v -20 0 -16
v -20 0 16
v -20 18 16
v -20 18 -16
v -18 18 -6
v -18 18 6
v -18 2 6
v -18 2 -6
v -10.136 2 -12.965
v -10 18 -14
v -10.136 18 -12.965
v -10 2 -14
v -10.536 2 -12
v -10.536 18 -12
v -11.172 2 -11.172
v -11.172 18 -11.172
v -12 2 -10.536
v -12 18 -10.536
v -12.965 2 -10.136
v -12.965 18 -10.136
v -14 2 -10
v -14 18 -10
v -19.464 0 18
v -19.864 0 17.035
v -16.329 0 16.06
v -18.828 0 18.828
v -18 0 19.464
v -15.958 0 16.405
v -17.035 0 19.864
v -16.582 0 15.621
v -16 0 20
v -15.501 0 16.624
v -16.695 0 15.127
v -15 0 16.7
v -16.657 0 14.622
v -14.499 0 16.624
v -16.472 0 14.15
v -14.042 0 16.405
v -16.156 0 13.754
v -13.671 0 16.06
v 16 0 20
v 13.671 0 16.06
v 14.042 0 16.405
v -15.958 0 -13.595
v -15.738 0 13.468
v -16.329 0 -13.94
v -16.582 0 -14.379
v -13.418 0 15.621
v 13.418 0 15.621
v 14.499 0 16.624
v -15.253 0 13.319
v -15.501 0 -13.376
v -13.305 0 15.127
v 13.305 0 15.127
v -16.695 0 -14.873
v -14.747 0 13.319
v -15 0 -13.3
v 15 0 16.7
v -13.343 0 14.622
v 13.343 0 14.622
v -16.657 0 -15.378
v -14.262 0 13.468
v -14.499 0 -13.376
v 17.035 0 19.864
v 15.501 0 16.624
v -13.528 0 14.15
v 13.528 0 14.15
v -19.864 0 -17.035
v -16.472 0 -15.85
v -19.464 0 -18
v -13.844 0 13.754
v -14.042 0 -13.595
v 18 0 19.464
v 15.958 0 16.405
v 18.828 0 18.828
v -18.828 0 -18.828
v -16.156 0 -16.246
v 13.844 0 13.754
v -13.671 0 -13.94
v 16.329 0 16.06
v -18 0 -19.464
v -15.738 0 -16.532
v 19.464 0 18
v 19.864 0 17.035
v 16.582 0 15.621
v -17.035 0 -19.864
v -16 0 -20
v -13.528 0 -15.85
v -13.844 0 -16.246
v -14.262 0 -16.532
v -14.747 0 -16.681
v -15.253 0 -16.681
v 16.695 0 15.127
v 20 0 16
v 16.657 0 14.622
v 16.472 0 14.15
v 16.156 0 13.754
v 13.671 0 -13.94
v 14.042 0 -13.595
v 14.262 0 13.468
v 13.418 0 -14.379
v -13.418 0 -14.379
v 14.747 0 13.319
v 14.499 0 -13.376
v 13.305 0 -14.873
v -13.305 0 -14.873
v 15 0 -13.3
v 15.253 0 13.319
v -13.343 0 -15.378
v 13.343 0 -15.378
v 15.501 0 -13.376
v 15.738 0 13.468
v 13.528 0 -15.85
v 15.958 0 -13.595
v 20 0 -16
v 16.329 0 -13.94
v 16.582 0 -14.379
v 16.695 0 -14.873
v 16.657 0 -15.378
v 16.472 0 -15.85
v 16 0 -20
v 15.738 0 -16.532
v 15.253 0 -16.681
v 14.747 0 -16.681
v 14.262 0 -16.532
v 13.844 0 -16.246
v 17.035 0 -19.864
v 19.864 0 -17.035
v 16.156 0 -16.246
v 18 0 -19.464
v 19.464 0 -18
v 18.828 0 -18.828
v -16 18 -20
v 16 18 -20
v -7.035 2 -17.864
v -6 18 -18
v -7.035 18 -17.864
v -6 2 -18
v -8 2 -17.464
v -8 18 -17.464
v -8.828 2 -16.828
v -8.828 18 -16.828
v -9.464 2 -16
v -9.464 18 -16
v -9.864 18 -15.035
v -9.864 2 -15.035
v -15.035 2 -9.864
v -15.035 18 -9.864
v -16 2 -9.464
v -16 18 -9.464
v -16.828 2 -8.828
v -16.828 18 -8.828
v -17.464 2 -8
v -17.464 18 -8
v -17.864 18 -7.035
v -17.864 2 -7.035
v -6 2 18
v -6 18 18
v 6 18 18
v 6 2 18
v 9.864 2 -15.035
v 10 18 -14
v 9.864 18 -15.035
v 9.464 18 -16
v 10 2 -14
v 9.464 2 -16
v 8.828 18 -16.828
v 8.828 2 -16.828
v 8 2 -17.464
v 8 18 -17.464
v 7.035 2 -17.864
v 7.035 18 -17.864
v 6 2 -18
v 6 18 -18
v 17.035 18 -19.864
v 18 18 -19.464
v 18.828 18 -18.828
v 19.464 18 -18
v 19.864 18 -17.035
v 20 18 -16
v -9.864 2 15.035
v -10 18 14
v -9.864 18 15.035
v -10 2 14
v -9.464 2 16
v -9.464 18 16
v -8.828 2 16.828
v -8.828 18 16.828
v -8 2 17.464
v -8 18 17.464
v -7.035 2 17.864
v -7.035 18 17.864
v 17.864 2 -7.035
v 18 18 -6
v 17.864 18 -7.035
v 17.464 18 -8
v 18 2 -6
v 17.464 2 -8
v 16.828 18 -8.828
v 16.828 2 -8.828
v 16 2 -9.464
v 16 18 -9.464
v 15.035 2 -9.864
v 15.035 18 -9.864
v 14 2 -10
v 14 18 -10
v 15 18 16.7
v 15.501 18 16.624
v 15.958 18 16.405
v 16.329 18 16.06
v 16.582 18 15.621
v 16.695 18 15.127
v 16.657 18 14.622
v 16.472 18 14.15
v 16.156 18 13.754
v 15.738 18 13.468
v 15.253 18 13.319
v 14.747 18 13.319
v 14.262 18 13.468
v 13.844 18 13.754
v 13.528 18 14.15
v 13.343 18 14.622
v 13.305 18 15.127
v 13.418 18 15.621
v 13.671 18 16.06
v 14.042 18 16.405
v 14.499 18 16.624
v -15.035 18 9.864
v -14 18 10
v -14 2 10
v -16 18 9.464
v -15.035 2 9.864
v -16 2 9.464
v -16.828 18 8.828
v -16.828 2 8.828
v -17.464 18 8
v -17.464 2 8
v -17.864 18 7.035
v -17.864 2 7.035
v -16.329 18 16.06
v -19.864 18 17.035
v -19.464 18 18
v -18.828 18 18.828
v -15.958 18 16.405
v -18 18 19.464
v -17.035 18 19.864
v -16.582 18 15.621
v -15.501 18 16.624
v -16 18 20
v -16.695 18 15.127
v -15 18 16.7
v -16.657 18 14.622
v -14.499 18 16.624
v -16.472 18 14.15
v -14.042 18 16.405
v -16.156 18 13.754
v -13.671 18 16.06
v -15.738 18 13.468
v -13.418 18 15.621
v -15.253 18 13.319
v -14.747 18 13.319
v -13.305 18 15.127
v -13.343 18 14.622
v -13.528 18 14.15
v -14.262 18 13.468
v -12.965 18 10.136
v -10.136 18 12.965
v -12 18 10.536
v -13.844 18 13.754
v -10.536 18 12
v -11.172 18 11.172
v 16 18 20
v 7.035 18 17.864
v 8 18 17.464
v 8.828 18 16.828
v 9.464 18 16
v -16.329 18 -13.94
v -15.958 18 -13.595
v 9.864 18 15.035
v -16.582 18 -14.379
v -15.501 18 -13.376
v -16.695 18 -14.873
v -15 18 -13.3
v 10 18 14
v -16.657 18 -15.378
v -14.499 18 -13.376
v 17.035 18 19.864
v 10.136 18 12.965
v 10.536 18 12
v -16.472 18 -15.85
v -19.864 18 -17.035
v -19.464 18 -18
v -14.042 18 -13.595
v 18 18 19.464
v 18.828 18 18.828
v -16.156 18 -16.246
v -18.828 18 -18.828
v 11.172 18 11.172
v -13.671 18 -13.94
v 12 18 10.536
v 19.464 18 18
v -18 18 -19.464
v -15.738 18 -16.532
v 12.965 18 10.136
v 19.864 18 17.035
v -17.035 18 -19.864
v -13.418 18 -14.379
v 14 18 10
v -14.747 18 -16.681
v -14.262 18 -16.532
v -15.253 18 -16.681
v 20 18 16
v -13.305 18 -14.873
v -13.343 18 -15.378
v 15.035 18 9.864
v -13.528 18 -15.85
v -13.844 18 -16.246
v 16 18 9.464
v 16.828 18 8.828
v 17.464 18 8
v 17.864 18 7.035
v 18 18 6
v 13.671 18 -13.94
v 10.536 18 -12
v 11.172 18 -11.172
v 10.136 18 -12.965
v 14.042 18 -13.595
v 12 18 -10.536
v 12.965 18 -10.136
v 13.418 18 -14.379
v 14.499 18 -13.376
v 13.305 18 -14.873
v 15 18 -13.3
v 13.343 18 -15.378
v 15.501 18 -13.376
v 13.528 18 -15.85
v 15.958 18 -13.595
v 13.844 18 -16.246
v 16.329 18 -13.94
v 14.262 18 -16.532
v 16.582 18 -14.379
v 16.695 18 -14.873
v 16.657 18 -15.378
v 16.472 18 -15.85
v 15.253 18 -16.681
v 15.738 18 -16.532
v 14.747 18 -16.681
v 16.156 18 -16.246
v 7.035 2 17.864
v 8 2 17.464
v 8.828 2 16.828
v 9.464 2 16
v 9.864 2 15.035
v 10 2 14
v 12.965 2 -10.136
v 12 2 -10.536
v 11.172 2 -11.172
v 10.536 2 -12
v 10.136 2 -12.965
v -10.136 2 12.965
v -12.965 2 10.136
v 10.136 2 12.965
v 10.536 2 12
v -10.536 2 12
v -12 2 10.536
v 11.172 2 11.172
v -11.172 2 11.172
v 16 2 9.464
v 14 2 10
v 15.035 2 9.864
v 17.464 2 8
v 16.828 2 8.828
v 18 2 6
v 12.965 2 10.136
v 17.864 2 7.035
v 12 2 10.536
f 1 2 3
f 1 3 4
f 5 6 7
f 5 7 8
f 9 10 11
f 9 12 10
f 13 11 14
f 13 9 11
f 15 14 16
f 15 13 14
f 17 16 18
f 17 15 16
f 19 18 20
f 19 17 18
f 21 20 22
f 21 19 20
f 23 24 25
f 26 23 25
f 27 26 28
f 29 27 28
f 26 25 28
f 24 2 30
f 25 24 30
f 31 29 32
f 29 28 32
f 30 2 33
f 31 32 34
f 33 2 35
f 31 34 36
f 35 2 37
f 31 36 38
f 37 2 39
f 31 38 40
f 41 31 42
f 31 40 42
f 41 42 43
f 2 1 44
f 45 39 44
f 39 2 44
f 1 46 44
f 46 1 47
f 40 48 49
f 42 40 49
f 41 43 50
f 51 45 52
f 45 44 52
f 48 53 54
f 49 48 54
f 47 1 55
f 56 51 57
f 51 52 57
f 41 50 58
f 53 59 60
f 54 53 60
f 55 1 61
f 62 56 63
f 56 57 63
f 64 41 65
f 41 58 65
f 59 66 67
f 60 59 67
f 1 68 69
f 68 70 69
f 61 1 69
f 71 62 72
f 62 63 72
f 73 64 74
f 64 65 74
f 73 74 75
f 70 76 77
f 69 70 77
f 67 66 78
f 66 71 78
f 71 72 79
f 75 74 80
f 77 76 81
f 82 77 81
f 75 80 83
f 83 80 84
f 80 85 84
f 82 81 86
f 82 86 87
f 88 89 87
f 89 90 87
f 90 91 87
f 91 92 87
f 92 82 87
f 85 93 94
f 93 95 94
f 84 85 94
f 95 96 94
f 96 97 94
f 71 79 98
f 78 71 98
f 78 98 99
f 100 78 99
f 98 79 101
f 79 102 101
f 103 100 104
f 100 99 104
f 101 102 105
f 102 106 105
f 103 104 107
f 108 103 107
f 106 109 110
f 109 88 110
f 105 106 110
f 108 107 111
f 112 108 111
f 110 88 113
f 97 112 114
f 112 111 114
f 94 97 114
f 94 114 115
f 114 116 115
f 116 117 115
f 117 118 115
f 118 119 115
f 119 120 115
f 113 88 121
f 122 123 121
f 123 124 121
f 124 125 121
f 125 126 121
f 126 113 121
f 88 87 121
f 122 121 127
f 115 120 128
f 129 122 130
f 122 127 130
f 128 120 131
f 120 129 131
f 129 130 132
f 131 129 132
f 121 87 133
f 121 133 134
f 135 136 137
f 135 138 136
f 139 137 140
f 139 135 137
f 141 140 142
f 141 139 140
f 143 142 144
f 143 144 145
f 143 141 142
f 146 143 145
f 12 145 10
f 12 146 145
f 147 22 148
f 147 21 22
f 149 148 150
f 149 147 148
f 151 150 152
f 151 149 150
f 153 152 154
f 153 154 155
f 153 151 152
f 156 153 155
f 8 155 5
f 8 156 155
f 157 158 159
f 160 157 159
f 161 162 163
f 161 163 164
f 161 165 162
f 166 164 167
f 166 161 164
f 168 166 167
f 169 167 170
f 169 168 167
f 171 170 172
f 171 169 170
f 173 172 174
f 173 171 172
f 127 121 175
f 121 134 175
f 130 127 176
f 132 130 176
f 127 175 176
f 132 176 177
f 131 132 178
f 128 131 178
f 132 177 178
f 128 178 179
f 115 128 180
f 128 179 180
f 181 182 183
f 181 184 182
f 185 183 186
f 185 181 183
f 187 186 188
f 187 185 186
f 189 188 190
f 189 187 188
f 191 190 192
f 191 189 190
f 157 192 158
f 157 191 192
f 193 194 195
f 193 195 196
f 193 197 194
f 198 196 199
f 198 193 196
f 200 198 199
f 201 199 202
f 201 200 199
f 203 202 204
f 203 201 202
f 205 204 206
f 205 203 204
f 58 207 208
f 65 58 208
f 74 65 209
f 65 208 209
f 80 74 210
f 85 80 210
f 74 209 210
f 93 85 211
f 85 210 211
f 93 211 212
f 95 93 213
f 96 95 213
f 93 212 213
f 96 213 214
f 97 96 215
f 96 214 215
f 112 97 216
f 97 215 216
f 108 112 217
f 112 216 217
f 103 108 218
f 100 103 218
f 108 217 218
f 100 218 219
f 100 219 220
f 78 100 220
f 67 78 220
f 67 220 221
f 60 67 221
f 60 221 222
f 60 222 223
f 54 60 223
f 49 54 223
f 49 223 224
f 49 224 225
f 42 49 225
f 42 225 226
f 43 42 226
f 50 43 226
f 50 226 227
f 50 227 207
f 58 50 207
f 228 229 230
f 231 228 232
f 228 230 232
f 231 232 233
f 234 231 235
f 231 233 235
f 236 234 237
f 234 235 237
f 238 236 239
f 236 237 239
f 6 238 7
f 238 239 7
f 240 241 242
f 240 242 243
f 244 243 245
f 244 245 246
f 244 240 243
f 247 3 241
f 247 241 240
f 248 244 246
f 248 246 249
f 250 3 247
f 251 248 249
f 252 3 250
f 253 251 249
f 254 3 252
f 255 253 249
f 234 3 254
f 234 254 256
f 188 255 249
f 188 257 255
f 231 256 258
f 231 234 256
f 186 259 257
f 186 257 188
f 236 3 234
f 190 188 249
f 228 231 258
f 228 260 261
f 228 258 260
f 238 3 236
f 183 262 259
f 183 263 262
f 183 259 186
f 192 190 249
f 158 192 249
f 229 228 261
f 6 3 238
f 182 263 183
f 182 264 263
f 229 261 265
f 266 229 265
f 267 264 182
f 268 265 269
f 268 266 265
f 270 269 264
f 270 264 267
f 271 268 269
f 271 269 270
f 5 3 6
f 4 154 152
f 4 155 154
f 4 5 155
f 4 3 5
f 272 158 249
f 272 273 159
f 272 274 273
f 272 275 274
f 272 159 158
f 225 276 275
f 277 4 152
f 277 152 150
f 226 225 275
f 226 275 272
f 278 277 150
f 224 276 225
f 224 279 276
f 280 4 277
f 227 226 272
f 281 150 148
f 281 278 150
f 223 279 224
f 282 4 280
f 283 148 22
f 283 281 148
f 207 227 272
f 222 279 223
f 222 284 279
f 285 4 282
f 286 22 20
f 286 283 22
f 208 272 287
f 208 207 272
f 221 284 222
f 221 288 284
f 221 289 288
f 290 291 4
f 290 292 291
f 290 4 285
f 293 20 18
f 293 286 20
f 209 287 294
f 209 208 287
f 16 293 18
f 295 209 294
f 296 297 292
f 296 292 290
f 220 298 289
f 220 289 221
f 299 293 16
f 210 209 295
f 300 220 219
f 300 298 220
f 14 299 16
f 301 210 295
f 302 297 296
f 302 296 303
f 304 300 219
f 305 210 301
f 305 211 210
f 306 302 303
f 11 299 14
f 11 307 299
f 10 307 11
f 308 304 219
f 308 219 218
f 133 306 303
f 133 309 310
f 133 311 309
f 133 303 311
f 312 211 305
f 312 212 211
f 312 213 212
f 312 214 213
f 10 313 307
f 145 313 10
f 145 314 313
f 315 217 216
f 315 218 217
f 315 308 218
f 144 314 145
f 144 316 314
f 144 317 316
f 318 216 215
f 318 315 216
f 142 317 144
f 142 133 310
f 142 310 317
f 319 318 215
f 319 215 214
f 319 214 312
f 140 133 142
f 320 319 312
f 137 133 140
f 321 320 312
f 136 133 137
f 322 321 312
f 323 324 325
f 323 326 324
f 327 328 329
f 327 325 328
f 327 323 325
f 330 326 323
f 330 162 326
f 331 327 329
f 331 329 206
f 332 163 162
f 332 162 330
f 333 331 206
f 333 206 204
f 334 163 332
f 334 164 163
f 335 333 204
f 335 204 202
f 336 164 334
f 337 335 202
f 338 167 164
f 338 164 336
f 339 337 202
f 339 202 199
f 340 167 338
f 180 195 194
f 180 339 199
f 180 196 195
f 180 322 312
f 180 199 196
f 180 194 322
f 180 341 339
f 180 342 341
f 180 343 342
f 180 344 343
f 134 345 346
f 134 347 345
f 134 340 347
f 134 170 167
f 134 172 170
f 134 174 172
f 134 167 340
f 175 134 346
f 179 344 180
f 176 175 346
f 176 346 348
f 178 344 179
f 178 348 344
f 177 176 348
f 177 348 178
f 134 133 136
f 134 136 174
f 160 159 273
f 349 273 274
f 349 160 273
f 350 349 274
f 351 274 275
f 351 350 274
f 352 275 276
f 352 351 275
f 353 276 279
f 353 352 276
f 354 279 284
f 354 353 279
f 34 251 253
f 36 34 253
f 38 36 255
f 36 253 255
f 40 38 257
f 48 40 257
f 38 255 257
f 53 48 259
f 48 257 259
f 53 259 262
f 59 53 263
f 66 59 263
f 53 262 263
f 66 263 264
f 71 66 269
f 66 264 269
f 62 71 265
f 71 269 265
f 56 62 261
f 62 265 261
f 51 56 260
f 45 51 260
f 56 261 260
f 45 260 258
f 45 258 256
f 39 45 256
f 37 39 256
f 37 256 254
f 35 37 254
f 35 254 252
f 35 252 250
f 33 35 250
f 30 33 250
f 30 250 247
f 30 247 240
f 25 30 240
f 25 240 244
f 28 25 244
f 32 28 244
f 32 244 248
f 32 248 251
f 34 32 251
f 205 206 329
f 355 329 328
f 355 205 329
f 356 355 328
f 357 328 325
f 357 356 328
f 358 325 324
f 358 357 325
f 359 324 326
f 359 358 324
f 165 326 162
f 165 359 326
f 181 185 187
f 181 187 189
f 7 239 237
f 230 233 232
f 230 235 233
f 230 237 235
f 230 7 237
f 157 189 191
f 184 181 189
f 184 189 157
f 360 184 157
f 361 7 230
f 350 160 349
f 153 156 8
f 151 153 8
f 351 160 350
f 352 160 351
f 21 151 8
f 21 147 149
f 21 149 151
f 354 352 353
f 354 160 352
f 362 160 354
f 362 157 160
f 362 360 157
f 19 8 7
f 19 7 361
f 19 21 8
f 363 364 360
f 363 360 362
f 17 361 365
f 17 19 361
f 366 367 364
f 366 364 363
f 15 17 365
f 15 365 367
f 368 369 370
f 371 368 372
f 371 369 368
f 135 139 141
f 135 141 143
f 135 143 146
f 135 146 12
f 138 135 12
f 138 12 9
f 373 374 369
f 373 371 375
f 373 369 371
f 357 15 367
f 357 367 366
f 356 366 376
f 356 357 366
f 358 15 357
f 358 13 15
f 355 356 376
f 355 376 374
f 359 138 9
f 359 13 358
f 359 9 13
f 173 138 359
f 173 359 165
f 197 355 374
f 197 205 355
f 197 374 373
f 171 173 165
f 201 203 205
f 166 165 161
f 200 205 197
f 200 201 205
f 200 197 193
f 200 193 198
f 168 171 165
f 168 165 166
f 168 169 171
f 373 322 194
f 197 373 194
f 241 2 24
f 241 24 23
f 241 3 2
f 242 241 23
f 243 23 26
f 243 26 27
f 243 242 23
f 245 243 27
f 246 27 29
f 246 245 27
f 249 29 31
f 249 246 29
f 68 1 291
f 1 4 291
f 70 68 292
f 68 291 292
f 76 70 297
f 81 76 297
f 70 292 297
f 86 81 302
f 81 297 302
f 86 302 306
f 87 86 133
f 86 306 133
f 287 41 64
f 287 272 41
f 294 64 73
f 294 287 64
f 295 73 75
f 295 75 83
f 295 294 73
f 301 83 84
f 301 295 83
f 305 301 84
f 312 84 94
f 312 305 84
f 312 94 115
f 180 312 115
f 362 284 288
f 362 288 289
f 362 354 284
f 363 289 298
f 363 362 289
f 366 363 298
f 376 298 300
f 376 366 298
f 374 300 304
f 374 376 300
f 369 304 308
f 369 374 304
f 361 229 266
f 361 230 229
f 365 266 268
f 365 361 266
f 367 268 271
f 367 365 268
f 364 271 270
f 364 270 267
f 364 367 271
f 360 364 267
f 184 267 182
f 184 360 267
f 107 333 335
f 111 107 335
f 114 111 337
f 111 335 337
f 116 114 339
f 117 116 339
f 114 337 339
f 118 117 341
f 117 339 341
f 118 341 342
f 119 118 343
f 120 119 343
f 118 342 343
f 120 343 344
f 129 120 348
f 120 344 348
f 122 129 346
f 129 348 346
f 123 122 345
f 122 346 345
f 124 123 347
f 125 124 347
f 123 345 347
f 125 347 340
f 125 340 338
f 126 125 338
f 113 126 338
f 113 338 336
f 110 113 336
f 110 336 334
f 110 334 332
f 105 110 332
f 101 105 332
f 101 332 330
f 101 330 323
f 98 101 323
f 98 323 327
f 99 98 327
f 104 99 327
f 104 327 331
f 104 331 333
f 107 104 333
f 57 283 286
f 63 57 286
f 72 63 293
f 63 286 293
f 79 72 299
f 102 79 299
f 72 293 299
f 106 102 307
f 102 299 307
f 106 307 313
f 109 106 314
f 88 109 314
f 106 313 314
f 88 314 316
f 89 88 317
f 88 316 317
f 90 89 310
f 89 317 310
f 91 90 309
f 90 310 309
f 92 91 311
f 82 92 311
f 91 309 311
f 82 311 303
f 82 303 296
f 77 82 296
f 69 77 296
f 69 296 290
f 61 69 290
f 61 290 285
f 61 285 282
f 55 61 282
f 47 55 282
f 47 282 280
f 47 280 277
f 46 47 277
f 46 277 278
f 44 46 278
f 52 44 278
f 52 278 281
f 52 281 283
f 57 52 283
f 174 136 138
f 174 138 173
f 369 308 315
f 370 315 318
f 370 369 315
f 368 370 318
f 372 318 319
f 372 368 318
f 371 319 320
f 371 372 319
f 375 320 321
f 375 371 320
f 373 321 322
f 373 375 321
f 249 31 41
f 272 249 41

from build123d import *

# Parameters (mm, degrees)
SKETCH1_W           = 40
SKETCH1_H           = 40
BOSS_EXTRUDE1_DEPTH = 18
SKETCH2_R           = 1.7
CUT_EXTRUDE1_DEPTH  = 34.526109228
SKETCH3_W           = 36
SKETCH3_H           = 20
CUT_EXTRUDE2_DEPTH  = 16
CIRPATTERN1_COUNT   = 2
CIRPATTERN1_ANGLE   = 90
FILLET1_R           = 4


with BuildPart() as part:
    # Sketch1 → Boss-Extrude1 (new body)
    with BuildSketch(Plane(origin=(0, 0, 0), x_dir=(1, 0, 0), z_dir=(0, 1, 0))):
        Rectangle(SKETCH1_W, SKETCH1_H)
    extrude(amount=BOSS_EXTRUDE1_DEPTH)

    # Sketch2 → Cut-Extrude1 (cut, through all)
    with BuildSketch(Plane(origin=(0, 18, 0), x_dir=(1, 0, 0), z_dir=(0, 1, 0))):
        with Locations(Location((15, 15, 0), (0, 0, 270))):
            Circle(SKETCH2_R)
        with Locations(Location((15, -15, 0), (0, 0, 270))):
            Circle(SKETCH2_R)
        with Locations(Location((-15, -15, 0), (0, 0, 270))):
            Circle(SKETCH2_R)
        with Locations(Location((-15, 15, 0), (0, 0, 270))):
            Circle(SKETCH2_R)
    extrude(amount=-CUT_EXTRUDE1_DEPTH, mode=Mode.SUBTRACT)

    # Sketch3 → Cut-Extrude2 (cut)
    with BuildSketch(Plane(origin=(0, 18, 0), x_dir=(1, 0, 0), z_dir=(0, 1, 0))):
        Rectangle(SKETCH3_W, SKETCH3_H)
    cut_extrude2 = extrude(amount=-CUT_EXTRUDE2_DEPTH, mode=Mode.SUBTRACT)

    # CirPattern1: Cut-Extrude2 ×2 about axis
    cirpattern1_axis = Axis((0, 0, 0), (0, -1, 0))
    for i in range(1, CIRPATTERN1_COUNT):
        add(cut_extrude2.rotate(cirpattern1_axis, i * CIRPATTERN1_ANGLE / (CIRPATTERN1_COUNT - 1)), mode=Mode.SUBTRACT)

    # Fillet1
    fillet1_edges = [part.edges().sort_by_distance(p)[0] for p in [
        (20, 9, -20),
        (-20, 9, -20),
        (-20, 9, 20),
        (20, 9, 20),
        (-10, 10, 18),
        (-10, 10, 10),
        (-18, 10, 10),
        (-18, 10, -10),
        (-10, 10, -10),
        (-10, 10, -18),
        (10, 10, -18),
        (10, 10, -10),
        (18, 10, -10),
        (18, 10, 10),
        (10, 10, 18),
        (10, 10, 10),
    ]]
    fillet(fillet1_edges, radius=FILLET1_R - 0.0001)  # a hair under: the kernel refuses the full size


solid = part.part
